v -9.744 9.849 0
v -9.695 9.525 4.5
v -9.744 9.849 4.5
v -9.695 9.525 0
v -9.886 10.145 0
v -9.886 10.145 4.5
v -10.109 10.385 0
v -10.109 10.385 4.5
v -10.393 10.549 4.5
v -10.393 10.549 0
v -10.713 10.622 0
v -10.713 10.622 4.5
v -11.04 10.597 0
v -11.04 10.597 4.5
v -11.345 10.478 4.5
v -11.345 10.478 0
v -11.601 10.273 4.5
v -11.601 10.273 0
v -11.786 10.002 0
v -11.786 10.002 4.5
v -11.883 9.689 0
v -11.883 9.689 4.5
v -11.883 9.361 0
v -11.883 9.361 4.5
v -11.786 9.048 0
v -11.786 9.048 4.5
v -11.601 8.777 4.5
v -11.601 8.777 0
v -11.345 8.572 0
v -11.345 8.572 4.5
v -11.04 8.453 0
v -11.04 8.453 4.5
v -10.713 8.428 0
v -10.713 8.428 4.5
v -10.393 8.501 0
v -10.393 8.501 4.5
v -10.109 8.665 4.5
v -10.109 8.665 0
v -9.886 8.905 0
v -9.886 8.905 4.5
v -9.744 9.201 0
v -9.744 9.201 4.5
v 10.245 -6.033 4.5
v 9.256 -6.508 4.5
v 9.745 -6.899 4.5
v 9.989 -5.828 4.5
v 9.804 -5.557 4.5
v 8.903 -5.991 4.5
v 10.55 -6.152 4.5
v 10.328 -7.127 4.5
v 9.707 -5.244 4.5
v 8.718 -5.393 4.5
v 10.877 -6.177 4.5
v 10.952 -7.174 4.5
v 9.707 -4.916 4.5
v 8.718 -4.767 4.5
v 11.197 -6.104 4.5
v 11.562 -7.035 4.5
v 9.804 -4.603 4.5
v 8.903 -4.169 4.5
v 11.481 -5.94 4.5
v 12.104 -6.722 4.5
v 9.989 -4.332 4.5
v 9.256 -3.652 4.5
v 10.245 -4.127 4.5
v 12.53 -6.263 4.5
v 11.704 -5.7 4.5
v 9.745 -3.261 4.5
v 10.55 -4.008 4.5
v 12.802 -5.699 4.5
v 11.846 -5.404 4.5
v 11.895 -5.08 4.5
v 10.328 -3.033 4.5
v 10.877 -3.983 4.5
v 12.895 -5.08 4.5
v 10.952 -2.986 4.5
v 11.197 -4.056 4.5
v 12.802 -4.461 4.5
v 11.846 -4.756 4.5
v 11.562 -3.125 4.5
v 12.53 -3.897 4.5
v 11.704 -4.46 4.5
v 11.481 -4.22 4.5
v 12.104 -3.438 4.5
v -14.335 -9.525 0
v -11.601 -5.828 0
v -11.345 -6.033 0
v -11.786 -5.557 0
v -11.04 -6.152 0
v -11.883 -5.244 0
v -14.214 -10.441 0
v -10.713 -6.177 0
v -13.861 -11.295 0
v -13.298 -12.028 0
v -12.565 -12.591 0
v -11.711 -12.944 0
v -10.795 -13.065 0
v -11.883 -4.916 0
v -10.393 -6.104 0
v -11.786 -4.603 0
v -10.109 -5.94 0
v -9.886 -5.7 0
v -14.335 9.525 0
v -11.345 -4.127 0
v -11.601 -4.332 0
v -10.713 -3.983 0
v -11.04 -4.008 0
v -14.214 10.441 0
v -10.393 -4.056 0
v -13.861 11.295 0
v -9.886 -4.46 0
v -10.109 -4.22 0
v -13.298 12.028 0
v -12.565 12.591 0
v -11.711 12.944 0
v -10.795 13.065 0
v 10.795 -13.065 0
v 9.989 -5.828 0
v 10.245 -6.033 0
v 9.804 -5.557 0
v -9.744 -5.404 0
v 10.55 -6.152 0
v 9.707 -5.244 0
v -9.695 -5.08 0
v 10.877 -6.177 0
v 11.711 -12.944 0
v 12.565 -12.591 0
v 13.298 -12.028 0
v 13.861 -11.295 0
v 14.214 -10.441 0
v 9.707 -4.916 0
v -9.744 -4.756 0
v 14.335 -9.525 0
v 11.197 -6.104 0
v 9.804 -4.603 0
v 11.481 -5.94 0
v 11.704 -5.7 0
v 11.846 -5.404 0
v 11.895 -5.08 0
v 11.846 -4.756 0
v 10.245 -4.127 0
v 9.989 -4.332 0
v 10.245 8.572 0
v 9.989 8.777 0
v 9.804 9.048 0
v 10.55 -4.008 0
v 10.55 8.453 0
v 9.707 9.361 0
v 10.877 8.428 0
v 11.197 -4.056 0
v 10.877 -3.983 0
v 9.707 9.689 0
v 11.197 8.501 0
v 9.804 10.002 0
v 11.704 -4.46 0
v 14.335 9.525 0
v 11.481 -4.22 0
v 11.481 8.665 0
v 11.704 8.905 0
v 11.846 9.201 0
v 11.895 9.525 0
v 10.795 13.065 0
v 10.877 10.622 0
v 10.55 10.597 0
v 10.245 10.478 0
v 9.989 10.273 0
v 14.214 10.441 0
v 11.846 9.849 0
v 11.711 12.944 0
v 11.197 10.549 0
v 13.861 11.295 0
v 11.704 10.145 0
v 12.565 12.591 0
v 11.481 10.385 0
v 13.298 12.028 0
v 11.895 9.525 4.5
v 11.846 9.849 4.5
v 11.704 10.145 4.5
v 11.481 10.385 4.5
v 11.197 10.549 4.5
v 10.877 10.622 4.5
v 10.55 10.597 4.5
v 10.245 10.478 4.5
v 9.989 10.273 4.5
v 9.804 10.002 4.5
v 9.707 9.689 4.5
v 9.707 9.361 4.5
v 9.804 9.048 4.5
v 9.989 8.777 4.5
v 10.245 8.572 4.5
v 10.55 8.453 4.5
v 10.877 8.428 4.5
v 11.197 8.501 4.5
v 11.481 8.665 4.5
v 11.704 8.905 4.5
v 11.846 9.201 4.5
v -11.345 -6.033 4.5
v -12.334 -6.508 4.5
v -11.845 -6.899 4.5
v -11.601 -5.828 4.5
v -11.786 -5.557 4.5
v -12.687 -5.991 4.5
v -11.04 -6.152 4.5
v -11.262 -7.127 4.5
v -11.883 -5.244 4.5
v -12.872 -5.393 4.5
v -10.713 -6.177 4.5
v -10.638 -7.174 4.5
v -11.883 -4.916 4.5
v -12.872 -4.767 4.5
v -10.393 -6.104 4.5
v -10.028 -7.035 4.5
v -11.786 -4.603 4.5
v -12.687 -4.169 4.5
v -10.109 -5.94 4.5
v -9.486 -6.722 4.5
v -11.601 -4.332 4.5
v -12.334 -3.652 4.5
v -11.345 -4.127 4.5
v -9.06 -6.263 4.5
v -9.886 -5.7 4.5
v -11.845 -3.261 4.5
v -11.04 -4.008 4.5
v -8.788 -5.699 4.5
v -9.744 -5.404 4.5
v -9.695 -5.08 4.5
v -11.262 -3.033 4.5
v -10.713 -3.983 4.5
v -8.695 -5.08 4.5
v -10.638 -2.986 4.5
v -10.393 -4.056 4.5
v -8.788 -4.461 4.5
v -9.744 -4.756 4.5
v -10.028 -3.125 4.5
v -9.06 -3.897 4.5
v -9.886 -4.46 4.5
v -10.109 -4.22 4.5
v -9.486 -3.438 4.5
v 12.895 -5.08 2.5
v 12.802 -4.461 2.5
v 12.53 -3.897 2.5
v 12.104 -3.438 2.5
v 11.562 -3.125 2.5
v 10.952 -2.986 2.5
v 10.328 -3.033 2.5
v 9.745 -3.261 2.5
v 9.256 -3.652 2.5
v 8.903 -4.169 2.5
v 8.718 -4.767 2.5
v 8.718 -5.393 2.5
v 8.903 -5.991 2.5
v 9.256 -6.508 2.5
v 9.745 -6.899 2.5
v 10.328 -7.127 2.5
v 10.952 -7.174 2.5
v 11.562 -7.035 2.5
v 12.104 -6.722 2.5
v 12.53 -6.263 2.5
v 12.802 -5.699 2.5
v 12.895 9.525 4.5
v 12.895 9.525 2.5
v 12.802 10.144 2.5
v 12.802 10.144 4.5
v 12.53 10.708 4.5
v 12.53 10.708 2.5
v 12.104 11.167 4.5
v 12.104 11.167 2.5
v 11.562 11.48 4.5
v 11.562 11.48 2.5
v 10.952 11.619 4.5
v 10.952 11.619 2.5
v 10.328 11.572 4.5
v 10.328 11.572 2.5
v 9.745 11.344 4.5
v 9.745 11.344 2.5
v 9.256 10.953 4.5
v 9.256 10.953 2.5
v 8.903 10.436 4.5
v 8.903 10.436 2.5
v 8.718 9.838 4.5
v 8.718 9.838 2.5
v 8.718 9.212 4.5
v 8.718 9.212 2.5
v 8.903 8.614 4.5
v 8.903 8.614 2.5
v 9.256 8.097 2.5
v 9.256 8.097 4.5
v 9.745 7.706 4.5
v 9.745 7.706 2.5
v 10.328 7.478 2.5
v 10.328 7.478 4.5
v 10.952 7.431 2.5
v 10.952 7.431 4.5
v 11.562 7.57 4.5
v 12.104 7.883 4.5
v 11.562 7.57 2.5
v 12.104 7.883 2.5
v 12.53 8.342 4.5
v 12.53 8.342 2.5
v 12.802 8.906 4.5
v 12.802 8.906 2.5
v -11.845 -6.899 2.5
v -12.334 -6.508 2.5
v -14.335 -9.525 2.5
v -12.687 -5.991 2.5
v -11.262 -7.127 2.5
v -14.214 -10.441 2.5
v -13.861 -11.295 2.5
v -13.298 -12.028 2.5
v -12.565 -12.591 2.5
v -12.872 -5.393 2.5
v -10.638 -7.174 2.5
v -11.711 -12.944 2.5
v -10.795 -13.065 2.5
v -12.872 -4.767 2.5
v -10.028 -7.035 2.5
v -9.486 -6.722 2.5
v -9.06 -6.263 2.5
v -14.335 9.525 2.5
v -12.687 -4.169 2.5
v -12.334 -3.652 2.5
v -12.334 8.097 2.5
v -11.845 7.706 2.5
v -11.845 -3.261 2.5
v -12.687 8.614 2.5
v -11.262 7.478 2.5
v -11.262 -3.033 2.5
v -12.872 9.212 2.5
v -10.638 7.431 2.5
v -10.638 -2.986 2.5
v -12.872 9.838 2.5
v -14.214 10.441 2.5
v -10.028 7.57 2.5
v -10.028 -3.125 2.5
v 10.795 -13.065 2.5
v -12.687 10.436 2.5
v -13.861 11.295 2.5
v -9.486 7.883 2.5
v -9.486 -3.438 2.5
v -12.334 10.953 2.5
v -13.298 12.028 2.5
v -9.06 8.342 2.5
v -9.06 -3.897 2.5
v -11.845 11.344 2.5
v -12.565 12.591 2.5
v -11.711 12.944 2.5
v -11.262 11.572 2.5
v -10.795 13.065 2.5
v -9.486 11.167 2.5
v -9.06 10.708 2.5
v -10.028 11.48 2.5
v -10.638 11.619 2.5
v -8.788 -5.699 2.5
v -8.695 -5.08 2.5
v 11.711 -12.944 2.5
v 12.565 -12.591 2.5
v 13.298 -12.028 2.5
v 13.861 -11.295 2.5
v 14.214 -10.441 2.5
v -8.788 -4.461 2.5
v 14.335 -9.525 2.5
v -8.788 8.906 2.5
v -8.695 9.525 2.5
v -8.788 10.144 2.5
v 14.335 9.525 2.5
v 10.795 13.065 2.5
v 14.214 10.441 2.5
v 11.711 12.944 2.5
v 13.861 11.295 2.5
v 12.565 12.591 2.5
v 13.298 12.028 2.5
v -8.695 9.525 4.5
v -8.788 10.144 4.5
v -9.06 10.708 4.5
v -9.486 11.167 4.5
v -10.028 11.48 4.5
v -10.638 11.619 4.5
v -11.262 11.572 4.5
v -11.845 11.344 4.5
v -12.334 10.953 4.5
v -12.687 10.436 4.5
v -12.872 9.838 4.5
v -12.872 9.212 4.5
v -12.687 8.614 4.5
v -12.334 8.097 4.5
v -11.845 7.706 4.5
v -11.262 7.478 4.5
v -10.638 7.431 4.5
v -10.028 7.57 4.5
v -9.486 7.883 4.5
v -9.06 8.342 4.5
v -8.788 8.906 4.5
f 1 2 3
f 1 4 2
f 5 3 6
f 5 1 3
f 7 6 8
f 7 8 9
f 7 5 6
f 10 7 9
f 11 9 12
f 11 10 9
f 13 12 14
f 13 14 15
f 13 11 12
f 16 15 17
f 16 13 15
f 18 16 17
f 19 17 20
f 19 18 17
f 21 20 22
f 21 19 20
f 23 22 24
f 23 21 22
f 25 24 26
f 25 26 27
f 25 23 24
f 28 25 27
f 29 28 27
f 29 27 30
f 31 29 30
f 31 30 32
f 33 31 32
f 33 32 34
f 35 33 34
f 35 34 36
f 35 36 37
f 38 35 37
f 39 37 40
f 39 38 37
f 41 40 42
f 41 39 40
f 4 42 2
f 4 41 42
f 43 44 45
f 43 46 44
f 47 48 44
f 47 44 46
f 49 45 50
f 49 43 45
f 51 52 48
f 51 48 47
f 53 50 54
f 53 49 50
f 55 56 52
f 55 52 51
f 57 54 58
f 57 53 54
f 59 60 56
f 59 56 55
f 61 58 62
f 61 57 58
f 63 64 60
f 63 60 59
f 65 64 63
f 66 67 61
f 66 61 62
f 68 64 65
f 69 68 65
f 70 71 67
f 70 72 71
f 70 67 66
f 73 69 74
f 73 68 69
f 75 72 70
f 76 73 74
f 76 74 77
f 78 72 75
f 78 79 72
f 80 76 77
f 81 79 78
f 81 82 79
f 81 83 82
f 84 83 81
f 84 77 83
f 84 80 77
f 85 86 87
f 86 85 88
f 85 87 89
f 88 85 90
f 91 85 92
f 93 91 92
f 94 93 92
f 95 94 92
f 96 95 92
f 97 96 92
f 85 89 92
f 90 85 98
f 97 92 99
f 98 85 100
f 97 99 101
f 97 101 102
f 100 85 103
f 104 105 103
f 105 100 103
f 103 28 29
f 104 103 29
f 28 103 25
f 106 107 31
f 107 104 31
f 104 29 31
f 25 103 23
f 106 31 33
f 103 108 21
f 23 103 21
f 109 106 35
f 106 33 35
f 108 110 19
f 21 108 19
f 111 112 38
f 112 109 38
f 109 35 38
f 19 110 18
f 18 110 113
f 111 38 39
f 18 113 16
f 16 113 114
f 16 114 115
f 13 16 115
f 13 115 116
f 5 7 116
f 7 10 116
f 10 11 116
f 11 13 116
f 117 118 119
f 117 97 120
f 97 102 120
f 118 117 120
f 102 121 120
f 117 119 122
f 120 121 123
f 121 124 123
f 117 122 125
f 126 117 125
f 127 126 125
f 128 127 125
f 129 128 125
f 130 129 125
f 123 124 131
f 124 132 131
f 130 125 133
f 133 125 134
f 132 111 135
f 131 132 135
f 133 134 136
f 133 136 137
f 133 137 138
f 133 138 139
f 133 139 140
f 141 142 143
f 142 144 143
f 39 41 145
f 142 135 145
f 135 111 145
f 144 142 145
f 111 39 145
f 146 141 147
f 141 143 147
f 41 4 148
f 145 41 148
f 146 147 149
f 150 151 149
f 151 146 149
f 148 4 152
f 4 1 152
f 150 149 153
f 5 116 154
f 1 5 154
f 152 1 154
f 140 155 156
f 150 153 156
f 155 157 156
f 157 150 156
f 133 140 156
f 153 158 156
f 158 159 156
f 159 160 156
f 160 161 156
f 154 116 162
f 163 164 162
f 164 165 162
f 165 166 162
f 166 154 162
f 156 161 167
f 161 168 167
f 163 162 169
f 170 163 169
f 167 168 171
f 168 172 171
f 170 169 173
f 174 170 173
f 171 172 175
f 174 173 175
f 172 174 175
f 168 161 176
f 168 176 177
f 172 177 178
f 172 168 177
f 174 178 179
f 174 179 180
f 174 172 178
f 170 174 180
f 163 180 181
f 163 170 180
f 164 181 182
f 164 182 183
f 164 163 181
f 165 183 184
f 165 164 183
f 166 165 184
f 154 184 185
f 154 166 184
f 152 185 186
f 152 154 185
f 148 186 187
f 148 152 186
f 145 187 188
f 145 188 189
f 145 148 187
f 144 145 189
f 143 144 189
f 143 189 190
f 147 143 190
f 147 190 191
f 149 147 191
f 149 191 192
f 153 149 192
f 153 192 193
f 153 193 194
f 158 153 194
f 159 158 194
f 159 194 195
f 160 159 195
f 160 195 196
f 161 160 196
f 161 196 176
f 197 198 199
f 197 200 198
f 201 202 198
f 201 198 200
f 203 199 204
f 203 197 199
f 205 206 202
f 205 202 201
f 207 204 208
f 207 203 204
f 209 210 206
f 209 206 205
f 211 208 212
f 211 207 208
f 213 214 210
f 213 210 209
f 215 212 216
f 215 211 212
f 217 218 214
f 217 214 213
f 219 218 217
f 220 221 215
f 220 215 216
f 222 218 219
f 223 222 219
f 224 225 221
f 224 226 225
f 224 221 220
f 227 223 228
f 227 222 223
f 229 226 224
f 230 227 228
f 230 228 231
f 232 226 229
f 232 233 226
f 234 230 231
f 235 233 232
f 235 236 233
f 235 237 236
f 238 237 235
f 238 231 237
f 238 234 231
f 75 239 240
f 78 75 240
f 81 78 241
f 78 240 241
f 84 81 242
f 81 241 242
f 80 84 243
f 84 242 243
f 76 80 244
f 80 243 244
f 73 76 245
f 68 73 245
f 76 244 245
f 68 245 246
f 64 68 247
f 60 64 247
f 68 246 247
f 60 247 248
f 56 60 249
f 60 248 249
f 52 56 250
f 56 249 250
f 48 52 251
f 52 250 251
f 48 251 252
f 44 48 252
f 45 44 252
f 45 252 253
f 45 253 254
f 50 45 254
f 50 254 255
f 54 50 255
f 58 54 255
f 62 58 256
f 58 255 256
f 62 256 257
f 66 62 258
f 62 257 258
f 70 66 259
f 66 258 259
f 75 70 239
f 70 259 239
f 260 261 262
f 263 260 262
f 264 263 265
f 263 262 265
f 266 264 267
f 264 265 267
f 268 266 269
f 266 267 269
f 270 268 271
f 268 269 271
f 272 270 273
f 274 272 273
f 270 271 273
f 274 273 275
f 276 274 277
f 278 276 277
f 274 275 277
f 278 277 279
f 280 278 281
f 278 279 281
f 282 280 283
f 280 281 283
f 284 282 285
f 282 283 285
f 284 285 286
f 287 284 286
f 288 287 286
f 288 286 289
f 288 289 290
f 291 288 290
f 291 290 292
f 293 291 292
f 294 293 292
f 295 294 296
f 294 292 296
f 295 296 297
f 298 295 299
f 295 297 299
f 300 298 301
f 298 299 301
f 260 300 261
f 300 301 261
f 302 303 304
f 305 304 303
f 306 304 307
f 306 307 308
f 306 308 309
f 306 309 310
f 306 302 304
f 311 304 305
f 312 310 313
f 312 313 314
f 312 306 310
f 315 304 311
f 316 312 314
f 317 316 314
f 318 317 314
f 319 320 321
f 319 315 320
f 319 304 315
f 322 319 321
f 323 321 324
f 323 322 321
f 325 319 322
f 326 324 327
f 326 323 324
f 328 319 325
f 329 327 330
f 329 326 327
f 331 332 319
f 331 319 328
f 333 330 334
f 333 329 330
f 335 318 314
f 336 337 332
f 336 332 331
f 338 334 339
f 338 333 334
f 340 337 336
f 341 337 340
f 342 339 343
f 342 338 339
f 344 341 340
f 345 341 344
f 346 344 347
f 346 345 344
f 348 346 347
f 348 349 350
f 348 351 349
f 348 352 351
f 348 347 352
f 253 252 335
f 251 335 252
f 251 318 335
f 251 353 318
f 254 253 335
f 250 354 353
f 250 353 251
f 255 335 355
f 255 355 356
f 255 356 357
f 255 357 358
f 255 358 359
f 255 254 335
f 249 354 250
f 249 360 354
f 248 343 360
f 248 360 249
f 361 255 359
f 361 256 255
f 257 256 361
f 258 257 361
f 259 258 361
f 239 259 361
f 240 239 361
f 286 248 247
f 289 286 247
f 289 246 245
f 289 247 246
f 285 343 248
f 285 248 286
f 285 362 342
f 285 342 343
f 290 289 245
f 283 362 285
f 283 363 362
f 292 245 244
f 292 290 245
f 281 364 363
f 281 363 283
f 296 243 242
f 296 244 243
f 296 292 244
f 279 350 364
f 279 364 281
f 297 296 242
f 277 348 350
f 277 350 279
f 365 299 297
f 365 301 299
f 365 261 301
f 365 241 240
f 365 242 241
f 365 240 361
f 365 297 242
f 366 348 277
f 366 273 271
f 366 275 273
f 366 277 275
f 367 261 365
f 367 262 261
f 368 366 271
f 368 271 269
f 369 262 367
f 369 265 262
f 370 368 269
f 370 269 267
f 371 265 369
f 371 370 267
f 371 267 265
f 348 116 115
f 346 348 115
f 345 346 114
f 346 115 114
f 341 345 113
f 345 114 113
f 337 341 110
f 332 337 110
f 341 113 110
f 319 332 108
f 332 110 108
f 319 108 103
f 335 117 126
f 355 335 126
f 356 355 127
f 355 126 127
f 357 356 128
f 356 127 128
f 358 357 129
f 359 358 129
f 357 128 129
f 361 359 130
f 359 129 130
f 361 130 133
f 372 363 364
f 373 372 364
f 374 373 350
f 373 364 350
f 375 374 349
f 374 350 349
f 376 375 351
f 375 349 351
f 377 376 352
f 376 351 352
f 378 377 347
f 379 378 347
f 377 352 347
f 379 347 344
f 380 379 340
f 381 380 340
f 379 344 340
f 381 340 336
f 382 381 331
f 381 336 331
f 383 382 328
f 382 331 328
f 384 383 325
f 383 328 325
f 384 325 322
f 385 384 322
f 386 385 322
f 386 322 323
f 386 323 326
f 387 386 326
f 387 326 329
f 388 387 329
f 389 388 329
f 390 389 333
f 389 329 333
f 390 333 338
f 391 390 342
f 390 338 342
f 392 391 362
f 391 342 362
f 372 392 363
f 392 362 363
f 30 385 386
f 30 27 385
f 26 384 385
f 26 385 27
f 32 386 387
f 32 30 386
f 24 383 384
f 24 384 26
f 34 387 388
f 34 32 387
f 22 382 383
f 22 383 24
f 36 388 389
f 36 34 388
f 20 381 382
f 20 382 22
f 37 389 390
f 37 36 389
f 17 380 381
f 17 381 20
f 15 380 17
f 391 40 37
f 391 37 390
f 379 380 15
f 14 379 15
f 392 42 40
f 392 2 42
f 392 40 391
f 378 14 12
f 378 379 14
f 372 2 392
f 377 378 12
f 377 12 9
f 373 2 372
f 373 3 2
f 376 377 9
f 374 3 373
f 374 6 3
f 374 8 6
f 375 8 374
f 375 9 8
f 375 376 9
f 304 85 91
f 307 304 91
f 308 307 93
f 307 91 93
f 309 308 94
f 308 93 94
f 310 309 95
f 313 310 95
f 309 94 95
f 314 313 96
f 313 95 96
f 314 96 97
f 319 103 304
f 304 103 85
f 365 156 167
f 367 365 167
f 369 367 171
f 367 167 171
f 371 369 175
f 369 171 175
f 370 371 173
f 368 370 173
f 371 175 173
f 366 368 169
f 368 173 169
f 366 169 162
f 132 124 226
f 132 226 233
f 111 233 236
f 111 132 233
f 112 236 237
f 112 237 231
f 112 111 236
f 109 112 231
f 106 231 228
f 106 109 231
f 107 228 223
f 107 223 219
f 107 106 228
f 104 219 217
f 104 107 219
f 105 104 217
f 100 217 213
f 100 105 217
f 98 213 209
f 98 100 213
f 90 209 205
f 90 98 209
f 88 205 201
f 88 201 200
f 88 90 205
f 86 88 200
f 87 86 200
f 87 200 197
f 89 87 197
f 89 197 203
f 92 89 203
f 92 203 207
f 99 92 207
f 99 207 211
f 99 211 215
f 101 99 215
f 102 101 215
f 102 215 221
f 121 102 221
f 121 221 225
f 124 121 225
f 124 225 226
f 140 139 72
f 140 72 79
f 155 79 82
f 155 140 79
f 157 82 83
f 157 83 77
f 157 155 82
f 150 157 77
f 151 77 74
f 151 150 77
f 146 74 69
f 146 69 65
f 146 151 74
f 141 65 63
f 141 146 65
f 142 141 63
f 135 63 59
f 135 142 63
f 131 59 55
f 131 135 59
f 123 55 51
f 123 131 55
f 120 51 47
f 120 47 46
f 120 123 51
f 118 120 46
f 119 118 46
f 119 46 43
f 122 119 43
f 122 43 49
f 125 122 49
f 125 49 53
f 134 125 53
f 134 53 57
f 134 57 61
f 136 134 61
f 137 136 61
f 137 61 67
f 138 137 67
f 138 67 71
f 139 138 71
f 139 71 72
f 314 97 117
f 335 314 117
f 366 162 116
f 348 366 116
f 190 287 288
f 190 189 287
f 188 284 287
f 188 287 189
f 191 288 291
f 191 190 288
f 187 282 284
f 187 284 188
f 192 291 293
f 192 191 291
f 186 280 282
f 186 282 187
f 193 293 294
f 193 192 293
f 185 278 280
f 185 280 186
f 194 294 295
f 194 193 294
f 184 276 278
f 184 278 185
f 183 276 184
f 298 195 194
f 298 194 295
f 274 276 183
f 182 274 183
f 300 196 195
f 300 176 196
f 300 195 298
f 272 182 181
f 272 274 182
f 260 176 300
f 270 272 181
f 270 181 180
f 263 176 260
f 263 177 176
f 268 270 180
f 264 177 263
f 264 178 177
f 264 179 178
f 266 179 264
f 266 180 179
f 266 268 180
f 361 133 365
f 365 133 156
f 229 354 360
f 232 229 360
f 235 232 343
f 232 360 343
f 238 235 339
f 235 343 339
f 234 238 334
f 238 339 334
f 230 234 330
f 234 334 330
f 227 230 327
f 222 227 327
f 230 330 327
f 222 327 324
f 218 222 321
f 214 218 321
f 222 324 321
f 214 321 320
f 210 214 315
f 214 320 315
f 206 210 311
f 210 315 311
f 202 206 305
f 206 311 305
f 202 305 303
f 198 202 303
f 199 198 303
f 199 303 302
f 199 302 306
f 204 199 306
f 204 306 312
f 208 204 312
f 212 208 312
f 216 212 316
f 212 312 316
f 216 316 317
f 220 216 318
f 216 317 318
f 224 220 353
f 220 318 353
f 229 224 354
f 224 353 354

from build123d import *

# Parameters (mm, degrees)
SKETCH1_R           = 2.1
SKETCH1_R_2         = 1.1
BOSS_EXTRUDE1_DEPTH = 2.5
BOSS_EXTRUDE2_START = 2.5
SKETCH1_3_R         = 2.1
SKETCH1_3_R_2       = 1.1
BOSS_EXTRUDE2_DEPTH = 2


with BuildPart() as part:
    # Sketch1 → Boss-Extrude1 (new body)
    # profile 1 of 5: a face of its own
    with BuildSketch(Plane.XY):
        with BuildLine():
            Line((10.795, 13.065), (-10.795, 13.065))
            ThreePointArc((-10.795, 13.065), (-13.298158005, 12.028158005), (-14.335, 9.525))
            Line((-14.335, 9.525), (-14.335, -9.525))
            ThreePointArc((-14.335, -9.525), (-13.298158005, -12.028158005), (-10.795, -13.065))
            Line((-10.795, -13.065), (10.795, -13.065))
            ThreePointArc((10.795, -13.065), (13.298158005, -12.028158005), (14.335, -9.525))
            Line((14.335, -9.525), (14.335, 9.525))
            ThreePointArc((14.335, 9.525), (13.298158005, 12.028158005), (10.795, 13.065))
        make_face()
        with Locations((10.795, 9.525)):
            Circle(SKETCH1_R, mode=Mode.SUBTRACT)
        with Locations((10.795, -5.08)):
            Circle(SKETCH1_R, mode=Mode.SUBTRACT)
        with Locations((-10.795, -5.08)):
            Circle(SKETCH1_R, mode=Mode.SUBTRACT)
        with Locations((-10.795, 9.525)):
            Circle(SKETCH1_R, mode=Mode.SUBTRACT)
    # profile 2 of 5: a face of its own
    with BuildSketch(Plane.XY):
        with Locations((-10.795, -5.08)):
            Circle(SKETCH1_R)
        with Locations((-10.795, -5.08)):
            Circle(SKETCH1_R_2, mode=Mode.SUBTRACT)
    # profile 3 of 5: a face of its own
    with BuildSketch(Plane.XY):
        with Locations((-10.795, 9.525)):
            Circle(SKETCH1_R)
        with Locations((-10.795, 9.525)):
            Circle(SKETCH1_R_2, mode=Mode.SUBTRACT)
    # profile 4 of 5: a face of its own
    with BuildSketch(Plane.XY):
        with Locations((10.795, 9.525)):
            Circle(SKETCH1_R)
        with Locations((10.795, 9.525)):
            Circle(SKETCH1_R_2, mode=Mode.SUBTRACT)
    # profile 5 of 5: a face of its own
    with BuildSketch(Plane.XY):
        with Locations((10.795, -5.08)):
            Circle(SKETCH1_R)
        with Locations((10.795, -5.08)):
            Circle(SKETCH1_R_2, mode=Mode.SUBTRACT)
    extrude(amount=BOSS_EXTRUDE1_DEPTH)

    # Sketch1<3> → Boss-Extrude2 (add)
    # profile 1 of 4: a face of its own
    with BuildSketch(Plane.XY.offset(BOSS_EXTRUDE2_START)):
        with Locations((-10.795, 9.525)):
            Circle(SKETCH1_3_R)
        with Locations((-10.795, 9.525)):
            Circle(SKETCH1_3_R_2, mode=Mode.SUBTRACT)
    # profile 2 of 4: a face of its own
    with BuildSketch(Plane.XY.offset(BOSS_EXTRUDE2_START)):
        with Locations((10.795, 9.525)):
            Circle(SKETCH1_3_R)
        with Locations((10.795, 9.525)):
            Circle(SKETCH1_3_R_2, mode=Mode.SUBTRACT)
    # profile 3 of 4: a face of its own
    with BuildSketch(Plane.XY.offset(BOSS_EXTRUDE2_START)):
        with Locations((10.795, -5.08)):
            Circle(SKETCH1_3_R)
        with Locations((10.795, -5.08)):
            Circle(SKETCH1_3_R_2, mode=Mode.SUBTRACT)
    # profile 4 of 4: a face of its own
    with BuildSketch(Plane.XY.offset(BOSS_EXTRUDE2_START)):
        with Locations((-10.795, -5.08)):
            Circle(SKETCH1_3_R)
        with Locations((-10.795, -5.08)):
            Circle(SKETCH1_3_R_2, mode=Mode.SUBTRACT)
    extrude(amount=BOSS_EXTRUDE2_DEPTH)


solid = part.part
